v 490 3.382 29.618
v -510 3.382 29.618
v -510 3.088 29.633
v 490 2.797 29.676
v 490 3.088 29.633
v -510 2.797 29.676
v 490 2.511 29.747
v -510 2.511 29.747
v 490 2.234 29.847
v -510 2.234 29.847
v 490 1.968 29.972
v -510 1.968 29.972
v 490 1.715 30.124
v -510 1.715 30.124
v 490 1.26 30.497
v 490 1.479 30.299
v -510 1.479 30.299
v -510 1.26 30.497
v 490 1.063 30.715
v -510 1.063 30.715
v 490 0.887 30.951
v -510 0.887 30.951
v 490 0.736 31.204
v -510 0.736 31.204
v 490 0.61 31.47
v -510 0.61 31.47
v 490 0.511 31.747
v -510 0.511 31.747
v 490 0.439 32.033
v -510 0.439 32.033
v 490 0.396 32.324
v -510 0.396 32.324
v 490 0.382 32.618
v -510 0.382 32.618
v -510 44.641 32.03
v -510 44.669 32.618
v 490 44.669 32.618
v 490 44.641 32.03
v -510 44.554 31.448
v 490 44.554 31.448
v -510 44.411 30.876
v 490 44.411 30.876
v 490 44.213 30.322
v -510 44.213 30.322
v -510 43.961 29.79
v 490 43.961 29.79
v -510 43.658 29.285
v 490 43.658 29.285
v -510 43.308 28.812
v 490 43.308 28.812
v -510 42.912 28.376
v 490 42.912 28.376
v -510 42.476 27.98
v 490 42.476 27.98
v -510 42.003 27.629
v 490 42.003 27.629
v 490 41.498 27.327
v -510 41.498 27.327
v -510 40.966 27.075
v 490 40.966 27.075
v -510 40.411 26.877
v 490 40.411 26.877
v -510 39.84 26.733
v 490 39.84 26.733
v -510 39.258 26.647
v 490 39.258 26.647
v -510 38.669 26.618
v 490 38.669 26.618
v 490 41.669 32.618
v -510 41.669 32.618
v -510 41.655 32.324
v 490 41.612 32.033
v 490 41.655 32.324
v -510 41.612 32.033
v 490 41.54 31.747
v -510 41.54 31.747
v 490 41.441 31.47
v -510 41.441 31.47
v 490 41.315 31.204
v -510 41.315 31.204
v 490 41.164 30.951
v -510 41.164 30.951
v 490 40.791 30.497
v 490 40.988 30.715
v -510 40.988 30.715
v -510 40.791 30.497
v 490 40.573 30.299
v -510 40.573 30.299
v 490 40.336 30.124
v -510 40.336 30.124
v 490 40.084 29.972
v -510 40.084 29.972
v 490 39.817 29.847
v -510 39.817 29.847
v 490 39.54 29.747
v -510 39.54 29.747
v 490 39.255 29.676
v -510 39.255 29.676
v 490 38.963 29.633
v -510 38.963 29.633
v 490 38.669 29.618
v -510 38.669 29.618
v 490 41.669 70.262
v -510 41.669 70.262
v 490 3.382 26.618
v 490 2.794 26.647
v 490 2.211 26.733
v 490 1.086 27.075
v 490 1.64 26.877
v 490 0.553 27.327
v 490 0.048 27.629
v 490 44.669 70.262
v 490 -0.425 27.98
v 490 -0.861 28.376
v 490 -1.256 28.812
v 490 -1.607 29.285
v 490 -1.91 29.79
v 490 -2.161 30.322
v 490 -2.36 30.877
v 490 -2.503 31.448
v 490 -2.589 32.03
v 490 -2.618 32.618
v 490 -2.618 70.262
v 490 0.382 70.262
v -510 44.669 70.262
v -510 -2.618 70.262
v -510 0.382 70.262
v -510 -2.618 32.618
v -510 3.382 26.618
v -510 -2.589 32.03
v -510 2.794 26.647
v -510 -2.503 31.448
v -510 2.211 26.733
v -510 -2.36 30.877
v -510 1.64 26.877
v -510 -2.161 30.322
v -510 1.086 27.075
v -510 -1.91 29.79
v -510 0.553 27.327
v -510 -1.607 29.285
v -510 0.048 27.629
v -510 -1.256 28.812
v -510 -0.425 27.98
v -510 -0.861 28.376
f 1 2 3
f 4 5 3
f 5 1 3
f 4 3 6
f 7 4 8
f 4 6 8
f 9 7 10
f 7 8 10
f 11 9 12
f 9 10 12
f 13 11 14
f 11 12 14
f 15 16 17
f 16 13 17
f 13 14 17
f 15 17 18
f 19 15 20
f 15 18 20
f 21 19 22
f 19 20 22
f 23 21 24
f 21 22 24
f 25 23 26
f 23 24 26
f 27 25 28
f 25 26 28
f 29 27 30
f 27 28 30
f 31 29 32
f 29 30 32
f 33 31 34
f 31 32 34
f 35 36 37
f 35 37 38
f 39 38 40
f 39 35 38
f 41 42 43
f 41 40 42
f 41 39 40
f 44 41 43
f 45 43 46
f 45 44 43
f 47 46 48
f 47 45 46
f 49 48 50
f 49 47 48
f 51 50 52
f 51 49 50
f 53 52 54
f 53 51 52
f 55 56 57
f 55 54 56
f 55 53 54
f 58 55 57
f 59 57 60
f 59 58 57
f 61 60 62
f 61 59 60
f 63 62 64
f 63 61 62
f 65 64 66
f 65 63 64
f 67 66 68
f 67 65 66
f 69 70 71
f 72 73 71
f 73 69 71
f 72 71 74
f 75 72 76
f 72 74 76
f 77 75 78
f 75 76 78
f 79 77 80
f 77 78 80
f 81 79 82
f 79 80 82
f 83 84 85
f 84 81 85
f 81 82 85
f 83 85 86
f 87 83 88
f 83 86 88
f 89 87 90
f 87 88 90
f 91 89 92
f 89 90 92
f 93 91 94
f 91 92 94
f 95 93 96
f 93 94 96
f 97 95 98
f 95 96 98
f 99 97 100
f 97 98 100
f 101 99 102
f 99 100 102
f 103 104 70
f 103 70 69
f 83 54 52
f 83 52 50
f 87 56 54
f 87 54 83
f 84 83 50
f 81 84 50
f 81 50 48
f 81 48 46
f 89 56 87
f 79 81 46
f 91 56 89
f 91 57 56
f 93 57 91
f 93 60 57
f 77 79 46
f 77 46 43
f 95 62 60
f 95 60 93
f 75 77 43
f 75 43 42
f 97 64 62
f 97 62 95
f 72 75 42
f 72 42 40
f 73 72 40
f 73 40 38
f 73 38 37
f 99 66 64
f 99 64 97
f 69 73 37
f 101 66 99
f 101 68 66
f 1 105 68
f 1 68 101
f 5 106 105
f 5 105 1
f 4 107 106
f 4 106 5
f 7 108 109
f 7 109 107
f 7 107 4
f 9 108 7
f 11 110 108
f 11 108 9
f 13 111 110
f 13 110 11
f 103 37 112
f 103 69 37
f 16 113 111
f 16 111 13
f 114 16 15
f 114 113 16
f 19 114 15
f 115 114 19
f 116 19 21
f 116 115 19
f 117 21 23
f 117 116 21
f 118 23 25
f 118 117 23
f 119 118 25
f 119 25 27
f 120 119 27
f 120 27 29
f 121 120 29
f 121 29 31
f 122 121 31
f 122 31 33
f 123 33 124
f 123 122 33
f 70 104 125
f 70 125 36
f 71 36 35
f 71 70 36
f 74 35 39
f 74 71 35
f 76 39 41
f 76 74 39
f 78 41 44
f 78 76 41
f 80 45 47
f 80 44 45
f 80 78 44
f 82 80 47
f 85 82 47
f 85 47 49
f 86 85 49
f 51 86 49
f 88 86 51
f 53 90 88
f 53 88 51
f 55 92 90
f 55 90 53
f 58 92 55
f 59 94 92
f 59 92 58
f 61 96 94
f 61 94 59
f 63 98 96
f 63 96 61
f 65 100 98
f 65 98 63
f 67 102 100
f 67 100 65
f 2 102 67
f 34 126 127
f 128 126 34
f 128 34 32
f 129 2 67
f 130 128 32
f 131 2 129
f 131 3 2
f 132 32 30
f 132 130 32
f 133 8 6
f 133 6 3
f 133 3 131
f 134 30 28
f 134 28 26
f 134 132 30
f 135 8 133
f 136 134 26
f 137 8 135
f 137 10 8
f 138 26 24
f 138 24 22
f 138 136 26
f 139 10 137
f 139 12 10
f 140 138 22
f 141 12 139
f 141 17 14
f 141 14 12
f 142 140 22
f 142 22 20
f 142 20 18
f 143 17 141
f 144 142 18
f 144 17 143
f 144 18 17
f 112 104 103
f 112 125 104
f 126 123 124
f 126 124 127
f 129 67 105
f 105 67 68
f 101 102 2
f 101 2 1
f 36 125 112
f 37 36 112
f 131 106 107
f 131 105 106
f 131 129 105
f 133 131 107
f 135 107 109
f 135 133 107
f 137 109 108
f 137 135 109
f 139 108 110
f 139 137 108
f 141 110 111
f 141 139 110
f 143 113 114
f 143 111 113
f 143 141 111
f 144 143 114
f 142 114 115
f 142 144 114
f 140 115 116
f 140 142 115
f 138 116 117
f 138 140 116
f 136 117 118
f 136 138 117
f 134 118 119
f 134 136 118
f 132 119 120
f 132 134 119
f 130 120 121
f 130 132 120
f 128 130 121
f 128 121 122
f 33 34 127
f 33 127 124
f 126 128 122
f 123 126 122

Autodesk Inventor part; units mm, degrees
ref_plane "YZ Plane" through (0, 0, 0) normal (1, 0, 0) x (0, 1, 0)
ref_plane "XZ Plane" through (0, 0, 0) normal (0, 1, 0) x (-1, 0, 0)
ref_plane "XY Plane" through (0, 0, 0) normal (0, 0, 1) x (1, 0, 0)
sketch "Boceto2" plane through (0, 0, 0) normal (0, 0, 1) x (1, 0, 0)
  line L0 (490, -50) -> (-510, -50)
  line L1 (-510, -50) -> (-510, 70)
  line L2 (-510, 70) -> (490, 70)
  line L3 (490, 70) -> (490, -50)
  line L4 (-510, 70) -> (-510, 30)
  line L5 (-510, 30) -> (490, 30)
  line L6 (-510, 30) -> (-510, -10)
  line L7 (-510, -10) -> (490, -10)
  point P0 (0, 0)
  dimension "d8" = 1000
  dimension "d14" = 120
  dimension "d15" = 40
  dimension "d16" = 40
extrude "Extrusión2" add sketch "Boceto2" along normal blind 3
sketch "Boceto4" plane through (0, 0, 3) normal (0, 0, 1) x (1, 0, 0)
  line L0 (-510, 30) -> (490, 30) projected
  line L1 (-510, -10) -> (490, -10) projected
  point P0 (0, 0)
bend part "Pieza de plegado2" radius 3 angle 90 line through (-510, 30, 3) along (1, 0, 0) centre toward (0, 0, 1) moving side (0, 1, 0) both sides yes
sketch "Boceto5" plane through (-510, 27.8787, 3.8787) normal (0, 0.7071068, 0.7071068) x (1, 0, 0)
  line L0 (0, -77.6438) -> (1000, -77.6438) projected
  line L1 (0, -77.6438) -> (0, -37.6438)
  line L2 (0, 0) -> (0, -77.6438) projected
  line L3 (0, -37.6438) -> (1000, -37.6438)
  line L4 (1000, -77.6438) -> (1000, 0) projected
  point P0 (510, -16.9706)
  dimension "d19" = 40
  dimension "d20" = 90
bend part "Pieza de plegado3" radius 3 angle 90 line through (-510, 1.2605, 30.4969) along (1, 0, 0) centre toward (0, 0.7071068, 0.7071068) moving side (0, 0.7071068, -0.7071068) both sides yes
